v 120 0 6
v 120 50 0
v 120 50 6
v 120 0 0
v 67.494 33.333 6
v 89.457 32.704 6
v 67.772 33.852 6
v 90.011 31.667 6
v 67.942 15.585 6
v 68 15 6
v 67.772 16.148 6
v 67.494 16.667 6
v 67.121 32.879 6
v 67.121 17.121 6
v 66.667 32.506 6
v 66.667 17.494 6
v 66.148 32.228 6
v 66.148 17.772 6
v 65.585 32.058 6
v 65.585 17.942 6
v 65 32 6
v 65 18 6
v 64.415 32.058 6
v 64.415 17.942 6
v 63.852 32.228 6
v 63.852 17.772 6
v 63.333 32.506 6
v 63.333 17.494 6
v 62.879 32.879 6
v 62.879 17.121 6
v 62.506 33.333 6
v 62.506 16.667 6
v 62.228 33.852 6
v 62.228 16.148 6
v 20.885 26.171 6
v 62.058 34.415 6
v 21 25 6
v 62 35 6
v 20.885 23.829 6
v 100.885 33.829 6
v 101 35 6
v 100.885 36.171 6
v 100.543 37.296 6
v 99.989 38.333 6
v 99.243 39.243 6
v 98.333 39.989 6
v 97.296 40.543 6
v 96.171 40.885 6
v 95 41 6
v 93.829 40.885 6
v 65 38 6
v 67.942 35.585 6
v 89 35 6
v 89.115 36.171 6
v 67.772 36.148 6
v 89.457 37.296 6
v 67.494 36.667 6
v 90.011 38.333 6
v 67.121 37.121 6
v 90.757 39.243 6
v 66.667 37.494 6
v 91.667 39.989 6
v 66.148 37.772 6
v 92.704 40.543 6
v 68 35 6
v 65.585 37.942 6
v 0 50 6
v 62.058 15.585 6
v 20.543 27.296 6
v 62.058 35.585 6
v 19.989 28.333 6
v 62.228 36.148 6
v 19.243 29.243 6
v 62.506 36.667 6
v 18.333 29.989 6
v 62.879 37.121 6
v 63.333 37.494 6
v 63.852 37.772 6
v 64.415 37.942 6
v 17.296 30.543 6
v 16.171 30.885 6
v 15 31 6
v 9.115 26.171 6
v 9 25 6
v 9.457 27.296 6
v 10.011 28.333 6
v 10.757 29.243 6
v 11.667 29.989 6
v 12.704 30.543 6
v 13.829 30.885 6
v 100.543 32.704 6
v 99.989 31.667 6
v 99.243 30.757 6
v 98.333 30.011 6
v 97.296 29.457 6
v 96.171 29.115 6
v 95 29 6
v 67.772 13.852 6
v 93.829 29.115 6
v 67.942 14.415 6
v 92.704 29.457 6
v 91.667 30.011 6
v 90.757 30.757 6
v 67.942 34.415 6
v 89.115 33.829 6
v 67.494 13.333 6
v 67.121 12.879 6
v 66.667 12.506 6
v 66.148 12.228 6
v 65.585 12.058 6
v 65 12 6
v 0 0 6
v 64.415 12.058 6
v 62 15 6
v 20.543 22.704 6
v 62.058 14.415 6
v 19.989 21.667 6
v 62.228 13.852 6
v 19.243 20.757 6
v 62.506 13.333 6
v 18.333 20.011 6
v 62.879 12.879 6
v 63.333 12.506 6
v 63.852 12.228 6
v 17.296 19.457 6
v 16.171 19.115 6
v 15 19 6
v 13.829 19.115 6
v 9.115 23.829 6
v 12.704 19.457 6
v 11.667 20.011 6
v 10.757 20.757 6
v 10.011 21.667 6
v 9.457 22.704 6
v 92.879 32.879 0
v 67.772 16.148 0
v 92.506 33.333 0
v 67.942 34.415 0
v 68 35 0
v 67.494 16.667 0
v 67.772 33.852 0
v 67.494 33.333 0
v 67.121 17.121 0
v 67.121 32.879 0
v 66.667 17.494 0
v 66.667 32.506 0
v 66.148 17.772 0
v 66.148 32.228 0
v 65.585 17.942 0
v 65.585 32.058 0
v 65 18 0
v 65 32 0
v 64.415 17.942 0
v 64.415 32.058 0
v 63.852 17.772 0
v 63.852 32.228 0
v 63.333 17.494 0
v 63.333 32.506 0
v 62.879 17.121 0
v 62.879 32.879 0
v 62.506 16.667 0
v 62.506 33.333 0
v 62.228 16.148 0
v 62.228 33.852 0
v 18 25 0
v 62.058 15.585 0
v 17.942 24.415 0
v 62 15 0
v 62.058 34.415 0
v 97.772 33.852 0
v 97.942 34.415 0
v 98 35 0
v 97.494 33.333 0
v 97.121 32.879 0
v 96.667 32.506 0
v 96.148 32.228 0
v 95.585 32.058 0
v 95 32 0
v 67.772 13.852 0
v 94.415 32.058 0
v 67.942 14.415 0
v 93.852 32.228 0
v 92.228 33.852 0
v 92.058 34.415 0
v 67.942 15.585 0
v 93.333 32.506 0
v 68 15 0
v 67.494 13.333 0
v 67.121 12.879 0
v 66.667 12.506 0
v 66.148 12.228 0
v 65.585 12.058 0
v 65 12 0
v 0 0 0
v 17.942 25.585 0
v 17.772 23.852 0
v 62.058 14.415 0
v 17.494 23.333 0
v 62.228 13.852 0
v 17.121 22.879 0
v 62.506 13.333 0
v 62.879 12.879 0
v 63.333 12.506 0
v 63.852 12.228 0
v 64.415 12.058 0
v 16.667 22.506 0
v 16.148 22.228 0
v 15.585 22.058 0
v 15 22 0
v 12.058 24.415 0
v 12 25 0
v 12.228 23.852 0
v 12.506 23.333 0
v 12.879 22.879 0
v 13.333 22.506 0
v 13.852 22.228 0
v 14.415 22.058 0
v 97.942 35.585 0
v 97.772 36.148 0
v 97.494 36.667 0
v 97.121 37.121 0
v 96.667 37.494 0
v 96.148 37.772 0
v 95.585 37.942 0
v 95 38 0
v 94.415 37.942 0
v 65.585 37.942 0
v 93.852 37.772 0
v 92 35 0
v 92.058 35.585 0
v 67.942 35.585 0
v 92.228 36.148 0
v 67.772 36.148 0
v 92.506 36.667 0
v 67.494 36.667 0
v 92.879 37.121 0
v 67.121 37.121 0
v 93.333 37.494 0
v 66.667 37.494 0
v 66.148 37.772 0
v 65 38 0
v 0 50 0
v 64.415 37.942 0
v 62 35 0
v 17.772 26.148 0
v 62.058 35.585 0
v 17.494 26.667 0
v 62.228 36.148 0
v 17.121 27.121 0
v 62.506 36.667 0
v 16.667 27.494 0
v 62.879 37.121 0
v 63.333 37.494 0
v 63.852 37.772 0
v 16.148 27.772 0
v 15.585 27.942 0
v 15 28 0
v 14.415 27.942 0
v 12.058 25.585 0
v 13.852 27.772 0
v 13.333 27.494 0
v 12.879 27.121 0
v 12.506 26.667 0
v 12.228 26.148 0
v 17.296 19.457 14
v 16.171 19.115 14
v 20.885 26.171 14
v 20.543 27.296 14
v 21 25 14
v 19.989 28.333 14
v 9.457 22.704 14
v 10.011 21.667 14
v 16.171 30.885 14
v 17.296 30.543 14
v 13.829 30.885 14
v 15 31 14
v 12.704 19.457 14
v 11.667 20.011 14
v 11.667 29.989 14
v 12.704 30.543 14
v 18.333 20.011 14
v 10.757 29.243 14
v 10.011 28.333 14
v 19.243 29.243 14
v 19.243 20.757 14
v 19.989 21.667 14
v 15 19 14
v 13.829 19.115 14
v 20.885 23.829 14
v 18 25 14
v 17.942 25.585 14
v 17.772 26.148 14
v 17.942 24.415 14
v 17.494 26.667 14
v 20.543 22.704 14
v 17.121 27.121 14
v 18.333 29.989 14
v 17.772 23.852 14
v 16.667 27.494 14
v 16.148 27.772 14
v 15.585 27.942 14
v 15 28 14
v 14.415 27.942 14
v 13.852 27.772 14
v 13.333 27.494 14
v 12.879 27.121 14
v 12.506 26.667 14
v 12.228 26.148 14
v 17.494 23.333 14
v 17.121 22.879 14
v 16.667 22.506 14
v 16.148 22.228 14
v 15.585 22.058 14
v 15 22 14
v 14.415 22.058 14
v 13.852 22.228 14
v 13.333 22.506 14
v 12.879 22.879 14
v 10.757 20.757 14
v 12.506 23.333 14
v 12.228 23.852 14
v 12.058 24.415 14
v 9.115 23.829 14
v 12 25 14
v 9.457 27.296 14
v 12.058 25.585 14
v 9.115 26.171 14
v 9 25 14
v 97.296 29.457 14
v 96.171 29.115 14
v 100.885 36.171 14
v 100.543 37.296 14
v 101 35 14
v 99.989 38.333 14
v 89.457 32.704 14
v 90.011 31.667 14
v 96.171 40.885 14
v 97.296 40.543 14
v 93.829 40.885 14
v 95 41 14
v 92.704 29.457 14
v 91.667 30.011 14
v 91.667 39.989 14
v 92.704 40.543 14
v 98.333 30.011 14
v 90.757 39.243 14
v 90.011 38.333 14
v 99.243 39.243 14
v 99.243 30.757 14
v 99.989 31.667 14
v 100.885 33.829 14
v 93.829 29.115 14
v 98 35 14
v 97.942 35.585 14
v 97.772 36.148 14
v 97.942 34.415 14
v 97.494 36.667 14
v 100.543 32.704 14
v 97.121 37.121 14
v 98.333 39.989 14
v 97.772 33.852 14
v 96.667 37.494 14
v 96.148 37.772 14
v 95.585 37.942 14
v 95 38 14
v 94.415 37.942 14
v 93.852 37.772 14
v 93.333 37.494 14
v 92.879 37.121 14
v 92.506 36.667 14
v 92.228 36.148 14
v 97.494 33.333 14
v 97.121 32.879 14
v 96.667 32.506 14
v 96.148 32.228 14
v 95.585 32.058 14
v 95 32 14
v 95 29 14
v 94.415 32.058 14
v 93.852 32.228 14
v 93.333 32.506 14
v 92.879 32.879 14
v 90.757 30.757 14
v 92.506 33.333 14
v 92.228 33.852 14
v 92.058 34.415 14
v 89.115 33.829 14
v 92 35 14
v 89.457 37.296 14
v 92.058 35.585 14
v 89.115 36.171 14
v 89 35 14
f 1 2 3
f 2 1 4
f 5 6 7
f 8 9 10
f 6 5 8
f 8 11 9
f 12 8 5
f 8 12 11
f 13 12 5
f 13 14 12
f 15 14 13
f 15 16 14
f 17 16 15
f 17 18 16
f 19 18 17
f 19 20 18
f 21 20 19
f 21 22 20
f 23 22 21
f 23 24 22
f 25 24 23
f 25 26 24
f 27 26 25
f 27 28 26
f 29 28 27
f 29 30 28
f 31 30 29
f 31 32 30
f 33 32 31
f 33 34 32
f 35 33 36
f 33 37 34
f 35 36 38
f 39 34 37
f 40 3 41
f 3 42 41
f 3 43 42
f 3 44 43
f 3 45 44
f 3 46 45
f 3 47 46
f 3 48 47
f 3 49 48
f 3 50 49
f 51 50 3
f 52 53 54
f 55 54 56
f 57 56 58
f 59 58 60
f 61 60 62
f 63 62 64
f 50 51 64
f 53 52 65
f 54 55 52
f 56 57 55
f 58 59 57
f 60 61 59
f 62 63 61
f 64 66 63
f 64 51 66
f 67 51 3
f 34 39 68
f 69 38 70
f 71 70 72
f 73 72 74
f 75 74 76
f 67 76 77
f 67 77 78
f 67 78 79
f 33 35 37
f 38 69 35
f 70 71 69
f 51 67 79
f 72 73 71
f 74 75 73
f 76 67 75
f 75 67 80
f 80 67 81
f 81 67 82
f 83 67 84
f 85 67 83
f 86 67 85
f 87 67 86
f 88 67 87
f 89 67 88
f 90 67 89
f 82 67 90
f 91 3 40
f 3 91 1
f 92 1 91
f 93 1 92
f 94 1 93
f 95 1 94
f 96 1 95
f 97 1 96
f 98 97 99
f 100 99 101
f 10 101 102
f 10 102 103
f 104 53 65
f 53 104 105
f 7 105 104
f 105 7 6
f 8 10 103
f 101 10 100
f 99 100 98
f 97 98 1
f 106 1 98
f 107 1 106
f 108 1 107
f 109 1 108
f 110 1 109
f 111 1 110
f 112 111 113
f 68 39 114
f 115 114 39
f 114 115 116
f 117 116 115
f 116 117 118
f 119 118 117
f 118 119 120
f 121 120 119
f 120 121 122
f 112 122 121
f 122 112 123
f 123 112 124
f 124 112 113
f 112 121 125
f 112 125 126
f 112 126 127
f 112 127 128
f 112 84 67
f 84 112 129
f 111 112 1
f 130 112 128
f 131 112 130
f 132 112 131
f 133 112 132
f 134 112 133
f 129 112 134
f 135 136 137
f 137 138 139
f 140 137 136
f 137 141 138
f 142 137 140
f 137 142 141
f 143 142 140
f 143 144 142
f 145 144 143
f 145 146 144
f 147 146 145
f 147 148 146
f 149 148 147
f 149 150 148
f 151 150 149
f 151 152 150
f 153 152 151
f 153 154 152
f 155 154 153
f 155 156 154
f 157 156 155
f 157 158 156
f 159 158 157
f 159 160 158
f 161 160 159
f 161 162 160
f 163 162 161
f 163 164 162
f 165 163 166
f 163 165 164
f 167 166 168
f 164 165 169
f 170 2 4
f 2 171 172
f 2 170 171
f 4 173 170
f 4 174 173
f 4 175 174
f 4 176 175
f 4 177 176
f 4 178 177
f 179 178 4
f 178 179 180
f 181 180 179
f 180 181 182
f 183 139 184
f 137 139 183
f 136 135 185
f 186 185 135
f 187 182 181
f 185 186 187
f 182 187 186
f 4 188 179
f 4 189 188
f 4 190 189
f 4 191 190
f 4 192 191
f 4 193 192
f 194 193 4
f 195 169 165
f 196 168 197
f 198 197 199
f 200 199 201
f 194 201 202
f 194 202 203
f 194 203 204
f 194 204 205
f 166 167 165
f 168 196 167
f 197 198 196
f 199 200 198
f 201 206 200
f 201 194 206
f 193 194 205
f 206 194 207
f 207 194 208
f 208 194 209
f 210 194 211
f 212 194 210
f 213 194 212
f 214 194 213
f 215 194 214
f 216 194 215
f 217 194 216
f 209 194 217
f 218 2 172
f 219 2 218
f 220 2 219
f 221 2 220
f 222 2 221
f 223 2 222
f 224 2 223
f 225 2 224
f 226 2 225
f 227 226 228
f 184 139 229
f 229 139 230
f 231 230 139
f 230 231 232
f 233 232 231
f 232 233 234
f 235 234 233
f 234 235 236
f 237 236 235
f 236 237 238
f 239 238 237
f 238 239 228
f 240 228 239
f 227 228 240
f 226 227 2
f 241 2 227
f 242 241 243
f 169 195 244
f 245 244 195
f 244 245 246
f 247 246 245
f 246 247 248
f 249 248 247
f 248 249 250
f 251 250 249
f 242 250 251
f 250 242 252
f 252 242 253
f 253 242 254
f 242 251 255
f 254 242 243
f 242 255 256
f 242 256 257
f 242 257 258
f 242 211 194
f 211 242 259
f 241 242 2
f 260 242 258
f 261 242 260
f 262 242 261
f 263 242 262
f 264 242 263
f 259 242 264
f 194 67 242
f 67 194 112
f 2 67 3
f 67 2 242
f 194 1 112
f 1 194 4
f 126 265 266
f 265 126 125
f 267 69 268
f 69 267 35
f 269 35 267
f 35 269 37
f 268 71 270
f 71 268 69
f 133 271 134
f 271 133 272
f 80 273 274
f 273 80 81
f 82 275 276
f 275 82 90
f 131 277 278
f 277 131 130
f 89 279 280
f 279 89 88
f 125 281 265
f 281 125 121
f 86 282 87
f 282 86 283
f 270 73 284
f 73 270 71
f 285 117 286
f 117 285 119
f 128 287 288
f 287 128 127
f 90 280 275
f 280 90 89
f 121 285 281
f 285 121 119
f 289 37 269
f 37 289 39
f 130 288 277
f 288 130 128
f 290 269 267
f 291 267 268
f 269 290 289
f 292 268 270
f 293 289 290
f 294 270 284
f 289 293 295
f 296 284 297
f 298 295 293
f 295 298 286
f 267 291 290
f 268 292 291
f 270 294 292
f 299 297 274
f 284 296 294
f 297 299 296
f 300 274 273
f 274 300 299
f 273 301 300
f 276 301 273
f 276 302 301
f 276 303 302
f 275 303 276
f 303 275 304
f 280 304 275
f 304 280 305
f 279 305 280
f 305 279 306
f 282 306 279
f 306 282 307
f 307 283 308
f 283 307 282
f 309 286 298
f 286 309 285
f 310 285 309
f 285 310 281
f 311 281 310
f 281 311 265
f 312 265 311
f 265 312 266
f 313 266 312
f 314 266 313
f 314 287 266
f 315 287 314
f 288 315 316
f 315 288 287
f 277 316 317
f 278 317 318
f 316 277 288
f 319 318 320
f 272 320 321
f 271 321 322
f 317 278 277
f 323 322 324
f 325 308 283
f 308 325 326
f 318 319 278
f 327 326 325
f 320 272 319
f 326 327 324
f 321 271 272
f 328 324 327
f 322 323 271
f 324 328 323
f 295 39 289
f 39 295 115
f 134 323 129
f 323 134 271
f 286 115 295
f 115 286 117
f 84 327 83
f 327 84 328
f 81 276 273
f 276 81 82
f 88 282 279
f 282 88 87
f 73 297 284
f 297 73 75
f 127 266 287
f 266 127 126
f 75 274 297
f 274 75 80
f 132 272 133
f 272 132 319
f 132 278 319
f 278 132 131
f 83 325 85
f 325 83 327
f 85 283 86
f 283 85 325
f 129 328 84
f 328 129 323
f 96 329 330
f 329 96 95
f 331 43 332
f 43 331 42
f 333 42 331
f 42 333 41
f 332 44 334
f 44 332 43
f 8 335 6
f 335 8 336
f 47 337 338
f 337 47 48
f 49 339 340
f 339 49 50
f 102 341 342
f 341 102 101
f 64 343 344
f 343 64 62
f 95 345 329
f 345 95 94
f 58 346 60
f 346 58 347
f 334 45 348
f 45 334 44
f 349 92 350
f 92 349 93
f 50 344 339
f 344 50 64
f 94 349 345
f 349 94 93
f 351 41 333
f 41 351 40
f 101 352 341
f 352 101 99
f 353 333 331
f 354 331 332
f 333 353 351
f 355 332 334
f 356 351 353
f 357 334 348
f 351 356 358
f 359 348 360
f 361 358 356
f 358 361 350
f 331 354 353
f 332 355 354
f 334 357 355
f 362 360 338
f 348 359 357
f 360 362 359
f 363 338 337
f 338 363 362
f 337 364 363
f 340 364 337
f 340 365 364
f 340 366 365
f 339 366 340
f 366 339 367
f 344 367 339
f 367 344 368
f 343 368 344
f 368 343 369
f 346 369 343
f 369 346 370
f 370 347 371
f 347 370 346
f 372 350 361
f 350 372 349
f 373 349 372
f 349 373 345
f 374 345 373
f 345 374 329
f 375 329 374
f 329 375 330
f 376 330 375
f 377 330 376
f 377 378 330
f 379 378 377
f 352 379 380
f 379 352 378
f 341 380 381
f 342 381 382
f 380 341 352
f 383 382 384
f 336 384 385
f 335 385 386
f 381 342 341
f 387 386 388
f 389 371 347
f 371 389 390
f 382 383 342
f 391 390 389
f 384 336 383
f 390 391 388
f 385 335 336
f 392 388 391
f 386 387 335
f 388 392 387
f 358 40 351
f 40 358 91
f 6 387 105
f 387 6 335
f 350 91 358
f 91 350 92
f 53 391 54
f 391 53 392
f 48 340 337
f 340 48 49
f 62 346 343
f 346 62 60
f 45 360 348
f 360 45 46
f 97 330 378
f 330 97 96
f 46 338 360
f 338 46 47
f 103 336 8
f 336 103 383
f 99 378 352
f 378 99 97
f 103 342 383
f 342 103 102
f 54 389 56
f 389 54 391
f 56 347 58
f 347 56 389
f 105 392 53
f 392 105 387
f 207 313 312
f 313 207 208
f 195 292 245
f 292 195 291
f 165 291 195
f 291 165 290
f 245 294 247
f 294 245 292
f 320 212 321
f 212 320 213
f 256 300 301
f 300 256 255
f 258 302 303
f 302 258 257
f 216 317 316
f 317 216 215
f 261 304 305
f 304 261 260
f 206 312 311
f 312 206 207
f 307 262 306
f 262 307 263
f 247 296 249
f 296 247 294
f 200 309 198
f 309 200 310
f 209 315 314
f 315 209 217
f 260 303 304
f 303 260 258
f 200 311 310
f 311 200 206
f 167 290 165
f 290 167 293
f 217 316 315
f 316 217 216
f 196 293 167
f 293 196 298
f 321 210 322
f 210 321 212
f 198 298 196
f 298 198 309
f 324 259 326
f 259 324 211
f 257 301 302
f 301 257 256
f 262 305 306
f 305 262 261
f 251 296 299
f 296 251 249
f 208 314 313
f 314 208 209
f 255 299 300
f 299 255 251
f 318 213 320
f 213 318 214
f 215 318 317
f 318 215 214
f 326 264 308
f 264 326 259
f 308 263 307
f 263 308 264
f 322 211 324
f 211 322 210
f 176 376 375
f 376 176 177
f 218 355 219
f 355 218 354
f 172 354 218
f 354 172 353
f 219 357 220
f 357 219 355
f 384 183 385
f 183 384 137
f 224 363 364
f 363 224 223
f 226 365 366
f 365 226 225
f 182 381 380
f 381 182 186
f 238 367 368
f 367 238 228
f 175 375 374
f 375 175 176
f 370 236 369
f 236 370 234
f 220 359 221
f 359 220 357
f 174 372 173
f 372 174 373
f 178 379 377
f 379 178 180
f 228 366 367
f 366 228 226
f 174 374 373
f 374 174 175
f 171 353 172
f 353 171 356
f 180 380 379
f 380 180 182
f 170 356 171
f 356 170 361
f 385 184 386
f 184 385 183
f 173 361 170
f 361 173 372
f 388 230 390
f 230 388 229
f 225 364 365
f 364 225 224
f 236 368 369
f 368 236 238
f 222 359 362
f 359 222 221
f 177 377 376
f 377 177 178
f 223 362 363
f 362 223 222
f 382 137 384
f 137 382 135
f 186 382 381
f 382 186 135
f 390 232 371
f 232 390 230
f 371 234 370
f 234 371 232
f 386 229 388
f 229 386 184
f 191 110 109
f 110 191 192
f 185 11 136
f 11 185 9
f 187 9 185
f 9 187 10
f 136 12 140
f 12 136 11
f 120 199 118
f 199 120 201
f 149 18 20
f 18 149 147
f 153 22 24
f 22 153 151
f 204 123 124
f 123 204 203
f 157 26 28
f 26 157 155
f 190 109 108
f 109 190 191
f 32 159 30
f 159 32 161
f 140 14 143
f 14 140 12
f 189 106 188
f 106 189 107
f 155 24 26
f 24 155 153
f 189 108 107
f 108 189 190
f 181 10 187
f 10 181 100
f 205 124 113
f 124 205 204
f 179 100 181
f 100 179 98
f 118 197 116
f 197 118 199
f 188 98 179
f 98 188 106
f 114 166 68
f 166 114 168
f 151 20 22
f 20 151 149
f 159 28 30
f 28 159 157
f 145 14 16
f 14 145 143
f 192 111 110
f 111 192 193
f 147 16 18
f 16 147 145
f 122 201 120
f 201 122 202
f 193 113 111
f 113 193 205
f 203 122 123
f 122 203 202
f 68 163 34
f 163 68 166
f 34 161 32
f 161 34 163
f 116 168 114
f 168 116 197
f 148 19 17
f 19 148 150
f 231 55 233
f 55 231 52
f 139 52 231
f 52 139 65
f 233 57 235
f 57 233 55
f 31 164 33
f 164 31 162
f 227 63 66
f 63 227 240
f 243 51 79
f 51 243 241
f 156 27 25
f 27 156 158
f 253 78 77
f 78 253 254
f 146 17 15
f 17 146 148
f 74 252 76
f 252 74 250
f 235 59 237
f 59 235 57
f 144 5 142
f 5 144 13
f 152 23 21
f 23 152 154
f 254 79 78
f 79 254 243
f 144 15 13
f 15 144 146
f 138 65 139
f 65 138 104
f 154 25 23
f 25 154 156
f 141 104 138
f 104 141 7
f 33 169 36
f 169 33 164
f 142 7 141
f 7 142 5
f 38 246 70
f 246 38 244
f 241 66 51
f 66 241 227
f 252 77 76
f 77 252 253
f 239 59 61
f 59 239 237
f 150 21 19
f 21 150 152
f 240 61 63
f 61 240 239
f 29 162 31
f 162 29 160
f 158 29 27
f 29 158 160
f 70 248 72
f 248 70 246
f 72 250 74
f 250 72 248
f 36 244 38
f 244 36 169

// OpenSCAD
$fn = 32;

// ----------------------------------------------------------------------
// Mixed field: bosses and holes at given coordinates
// ----------------------------------------------------------------------

// --- parameters (mm) ---
plate_l = 120;            // plate length, X
plate_w = 50;             // plate width, Y
plate_t = 6;              // plate thickness, Z
boss_d = 12;              // boss diameter
boss_h = 8;               // boss height above the plate
hole_d = 6;               // through hole diameter

total_h = plate_t + boss_h;  // overall height

difference() {
  union() {
    cube([plate_l, plate_w, plate_t]);
    translate([15, 25, plate_t]) cylinder(h = boss_h, d = boss_d);
    translate([95, 35, plate_t]) cylinder(h = boss_h, d = boss_d);
  }
  translate([15, 25, -1]) cylinder(h = total_h + 2, d = boss_d / 2);
  translate([95, 35, -1]) cylinder(h = total_h + 2, d = boss_d / 2);
  translate([65, 15, -1]) cylinder(h = plate_t + 2, d = hole_d);
  translate([65, 35, -1]) cylinder(h = plate_t + 2, d = hole_d);
}
